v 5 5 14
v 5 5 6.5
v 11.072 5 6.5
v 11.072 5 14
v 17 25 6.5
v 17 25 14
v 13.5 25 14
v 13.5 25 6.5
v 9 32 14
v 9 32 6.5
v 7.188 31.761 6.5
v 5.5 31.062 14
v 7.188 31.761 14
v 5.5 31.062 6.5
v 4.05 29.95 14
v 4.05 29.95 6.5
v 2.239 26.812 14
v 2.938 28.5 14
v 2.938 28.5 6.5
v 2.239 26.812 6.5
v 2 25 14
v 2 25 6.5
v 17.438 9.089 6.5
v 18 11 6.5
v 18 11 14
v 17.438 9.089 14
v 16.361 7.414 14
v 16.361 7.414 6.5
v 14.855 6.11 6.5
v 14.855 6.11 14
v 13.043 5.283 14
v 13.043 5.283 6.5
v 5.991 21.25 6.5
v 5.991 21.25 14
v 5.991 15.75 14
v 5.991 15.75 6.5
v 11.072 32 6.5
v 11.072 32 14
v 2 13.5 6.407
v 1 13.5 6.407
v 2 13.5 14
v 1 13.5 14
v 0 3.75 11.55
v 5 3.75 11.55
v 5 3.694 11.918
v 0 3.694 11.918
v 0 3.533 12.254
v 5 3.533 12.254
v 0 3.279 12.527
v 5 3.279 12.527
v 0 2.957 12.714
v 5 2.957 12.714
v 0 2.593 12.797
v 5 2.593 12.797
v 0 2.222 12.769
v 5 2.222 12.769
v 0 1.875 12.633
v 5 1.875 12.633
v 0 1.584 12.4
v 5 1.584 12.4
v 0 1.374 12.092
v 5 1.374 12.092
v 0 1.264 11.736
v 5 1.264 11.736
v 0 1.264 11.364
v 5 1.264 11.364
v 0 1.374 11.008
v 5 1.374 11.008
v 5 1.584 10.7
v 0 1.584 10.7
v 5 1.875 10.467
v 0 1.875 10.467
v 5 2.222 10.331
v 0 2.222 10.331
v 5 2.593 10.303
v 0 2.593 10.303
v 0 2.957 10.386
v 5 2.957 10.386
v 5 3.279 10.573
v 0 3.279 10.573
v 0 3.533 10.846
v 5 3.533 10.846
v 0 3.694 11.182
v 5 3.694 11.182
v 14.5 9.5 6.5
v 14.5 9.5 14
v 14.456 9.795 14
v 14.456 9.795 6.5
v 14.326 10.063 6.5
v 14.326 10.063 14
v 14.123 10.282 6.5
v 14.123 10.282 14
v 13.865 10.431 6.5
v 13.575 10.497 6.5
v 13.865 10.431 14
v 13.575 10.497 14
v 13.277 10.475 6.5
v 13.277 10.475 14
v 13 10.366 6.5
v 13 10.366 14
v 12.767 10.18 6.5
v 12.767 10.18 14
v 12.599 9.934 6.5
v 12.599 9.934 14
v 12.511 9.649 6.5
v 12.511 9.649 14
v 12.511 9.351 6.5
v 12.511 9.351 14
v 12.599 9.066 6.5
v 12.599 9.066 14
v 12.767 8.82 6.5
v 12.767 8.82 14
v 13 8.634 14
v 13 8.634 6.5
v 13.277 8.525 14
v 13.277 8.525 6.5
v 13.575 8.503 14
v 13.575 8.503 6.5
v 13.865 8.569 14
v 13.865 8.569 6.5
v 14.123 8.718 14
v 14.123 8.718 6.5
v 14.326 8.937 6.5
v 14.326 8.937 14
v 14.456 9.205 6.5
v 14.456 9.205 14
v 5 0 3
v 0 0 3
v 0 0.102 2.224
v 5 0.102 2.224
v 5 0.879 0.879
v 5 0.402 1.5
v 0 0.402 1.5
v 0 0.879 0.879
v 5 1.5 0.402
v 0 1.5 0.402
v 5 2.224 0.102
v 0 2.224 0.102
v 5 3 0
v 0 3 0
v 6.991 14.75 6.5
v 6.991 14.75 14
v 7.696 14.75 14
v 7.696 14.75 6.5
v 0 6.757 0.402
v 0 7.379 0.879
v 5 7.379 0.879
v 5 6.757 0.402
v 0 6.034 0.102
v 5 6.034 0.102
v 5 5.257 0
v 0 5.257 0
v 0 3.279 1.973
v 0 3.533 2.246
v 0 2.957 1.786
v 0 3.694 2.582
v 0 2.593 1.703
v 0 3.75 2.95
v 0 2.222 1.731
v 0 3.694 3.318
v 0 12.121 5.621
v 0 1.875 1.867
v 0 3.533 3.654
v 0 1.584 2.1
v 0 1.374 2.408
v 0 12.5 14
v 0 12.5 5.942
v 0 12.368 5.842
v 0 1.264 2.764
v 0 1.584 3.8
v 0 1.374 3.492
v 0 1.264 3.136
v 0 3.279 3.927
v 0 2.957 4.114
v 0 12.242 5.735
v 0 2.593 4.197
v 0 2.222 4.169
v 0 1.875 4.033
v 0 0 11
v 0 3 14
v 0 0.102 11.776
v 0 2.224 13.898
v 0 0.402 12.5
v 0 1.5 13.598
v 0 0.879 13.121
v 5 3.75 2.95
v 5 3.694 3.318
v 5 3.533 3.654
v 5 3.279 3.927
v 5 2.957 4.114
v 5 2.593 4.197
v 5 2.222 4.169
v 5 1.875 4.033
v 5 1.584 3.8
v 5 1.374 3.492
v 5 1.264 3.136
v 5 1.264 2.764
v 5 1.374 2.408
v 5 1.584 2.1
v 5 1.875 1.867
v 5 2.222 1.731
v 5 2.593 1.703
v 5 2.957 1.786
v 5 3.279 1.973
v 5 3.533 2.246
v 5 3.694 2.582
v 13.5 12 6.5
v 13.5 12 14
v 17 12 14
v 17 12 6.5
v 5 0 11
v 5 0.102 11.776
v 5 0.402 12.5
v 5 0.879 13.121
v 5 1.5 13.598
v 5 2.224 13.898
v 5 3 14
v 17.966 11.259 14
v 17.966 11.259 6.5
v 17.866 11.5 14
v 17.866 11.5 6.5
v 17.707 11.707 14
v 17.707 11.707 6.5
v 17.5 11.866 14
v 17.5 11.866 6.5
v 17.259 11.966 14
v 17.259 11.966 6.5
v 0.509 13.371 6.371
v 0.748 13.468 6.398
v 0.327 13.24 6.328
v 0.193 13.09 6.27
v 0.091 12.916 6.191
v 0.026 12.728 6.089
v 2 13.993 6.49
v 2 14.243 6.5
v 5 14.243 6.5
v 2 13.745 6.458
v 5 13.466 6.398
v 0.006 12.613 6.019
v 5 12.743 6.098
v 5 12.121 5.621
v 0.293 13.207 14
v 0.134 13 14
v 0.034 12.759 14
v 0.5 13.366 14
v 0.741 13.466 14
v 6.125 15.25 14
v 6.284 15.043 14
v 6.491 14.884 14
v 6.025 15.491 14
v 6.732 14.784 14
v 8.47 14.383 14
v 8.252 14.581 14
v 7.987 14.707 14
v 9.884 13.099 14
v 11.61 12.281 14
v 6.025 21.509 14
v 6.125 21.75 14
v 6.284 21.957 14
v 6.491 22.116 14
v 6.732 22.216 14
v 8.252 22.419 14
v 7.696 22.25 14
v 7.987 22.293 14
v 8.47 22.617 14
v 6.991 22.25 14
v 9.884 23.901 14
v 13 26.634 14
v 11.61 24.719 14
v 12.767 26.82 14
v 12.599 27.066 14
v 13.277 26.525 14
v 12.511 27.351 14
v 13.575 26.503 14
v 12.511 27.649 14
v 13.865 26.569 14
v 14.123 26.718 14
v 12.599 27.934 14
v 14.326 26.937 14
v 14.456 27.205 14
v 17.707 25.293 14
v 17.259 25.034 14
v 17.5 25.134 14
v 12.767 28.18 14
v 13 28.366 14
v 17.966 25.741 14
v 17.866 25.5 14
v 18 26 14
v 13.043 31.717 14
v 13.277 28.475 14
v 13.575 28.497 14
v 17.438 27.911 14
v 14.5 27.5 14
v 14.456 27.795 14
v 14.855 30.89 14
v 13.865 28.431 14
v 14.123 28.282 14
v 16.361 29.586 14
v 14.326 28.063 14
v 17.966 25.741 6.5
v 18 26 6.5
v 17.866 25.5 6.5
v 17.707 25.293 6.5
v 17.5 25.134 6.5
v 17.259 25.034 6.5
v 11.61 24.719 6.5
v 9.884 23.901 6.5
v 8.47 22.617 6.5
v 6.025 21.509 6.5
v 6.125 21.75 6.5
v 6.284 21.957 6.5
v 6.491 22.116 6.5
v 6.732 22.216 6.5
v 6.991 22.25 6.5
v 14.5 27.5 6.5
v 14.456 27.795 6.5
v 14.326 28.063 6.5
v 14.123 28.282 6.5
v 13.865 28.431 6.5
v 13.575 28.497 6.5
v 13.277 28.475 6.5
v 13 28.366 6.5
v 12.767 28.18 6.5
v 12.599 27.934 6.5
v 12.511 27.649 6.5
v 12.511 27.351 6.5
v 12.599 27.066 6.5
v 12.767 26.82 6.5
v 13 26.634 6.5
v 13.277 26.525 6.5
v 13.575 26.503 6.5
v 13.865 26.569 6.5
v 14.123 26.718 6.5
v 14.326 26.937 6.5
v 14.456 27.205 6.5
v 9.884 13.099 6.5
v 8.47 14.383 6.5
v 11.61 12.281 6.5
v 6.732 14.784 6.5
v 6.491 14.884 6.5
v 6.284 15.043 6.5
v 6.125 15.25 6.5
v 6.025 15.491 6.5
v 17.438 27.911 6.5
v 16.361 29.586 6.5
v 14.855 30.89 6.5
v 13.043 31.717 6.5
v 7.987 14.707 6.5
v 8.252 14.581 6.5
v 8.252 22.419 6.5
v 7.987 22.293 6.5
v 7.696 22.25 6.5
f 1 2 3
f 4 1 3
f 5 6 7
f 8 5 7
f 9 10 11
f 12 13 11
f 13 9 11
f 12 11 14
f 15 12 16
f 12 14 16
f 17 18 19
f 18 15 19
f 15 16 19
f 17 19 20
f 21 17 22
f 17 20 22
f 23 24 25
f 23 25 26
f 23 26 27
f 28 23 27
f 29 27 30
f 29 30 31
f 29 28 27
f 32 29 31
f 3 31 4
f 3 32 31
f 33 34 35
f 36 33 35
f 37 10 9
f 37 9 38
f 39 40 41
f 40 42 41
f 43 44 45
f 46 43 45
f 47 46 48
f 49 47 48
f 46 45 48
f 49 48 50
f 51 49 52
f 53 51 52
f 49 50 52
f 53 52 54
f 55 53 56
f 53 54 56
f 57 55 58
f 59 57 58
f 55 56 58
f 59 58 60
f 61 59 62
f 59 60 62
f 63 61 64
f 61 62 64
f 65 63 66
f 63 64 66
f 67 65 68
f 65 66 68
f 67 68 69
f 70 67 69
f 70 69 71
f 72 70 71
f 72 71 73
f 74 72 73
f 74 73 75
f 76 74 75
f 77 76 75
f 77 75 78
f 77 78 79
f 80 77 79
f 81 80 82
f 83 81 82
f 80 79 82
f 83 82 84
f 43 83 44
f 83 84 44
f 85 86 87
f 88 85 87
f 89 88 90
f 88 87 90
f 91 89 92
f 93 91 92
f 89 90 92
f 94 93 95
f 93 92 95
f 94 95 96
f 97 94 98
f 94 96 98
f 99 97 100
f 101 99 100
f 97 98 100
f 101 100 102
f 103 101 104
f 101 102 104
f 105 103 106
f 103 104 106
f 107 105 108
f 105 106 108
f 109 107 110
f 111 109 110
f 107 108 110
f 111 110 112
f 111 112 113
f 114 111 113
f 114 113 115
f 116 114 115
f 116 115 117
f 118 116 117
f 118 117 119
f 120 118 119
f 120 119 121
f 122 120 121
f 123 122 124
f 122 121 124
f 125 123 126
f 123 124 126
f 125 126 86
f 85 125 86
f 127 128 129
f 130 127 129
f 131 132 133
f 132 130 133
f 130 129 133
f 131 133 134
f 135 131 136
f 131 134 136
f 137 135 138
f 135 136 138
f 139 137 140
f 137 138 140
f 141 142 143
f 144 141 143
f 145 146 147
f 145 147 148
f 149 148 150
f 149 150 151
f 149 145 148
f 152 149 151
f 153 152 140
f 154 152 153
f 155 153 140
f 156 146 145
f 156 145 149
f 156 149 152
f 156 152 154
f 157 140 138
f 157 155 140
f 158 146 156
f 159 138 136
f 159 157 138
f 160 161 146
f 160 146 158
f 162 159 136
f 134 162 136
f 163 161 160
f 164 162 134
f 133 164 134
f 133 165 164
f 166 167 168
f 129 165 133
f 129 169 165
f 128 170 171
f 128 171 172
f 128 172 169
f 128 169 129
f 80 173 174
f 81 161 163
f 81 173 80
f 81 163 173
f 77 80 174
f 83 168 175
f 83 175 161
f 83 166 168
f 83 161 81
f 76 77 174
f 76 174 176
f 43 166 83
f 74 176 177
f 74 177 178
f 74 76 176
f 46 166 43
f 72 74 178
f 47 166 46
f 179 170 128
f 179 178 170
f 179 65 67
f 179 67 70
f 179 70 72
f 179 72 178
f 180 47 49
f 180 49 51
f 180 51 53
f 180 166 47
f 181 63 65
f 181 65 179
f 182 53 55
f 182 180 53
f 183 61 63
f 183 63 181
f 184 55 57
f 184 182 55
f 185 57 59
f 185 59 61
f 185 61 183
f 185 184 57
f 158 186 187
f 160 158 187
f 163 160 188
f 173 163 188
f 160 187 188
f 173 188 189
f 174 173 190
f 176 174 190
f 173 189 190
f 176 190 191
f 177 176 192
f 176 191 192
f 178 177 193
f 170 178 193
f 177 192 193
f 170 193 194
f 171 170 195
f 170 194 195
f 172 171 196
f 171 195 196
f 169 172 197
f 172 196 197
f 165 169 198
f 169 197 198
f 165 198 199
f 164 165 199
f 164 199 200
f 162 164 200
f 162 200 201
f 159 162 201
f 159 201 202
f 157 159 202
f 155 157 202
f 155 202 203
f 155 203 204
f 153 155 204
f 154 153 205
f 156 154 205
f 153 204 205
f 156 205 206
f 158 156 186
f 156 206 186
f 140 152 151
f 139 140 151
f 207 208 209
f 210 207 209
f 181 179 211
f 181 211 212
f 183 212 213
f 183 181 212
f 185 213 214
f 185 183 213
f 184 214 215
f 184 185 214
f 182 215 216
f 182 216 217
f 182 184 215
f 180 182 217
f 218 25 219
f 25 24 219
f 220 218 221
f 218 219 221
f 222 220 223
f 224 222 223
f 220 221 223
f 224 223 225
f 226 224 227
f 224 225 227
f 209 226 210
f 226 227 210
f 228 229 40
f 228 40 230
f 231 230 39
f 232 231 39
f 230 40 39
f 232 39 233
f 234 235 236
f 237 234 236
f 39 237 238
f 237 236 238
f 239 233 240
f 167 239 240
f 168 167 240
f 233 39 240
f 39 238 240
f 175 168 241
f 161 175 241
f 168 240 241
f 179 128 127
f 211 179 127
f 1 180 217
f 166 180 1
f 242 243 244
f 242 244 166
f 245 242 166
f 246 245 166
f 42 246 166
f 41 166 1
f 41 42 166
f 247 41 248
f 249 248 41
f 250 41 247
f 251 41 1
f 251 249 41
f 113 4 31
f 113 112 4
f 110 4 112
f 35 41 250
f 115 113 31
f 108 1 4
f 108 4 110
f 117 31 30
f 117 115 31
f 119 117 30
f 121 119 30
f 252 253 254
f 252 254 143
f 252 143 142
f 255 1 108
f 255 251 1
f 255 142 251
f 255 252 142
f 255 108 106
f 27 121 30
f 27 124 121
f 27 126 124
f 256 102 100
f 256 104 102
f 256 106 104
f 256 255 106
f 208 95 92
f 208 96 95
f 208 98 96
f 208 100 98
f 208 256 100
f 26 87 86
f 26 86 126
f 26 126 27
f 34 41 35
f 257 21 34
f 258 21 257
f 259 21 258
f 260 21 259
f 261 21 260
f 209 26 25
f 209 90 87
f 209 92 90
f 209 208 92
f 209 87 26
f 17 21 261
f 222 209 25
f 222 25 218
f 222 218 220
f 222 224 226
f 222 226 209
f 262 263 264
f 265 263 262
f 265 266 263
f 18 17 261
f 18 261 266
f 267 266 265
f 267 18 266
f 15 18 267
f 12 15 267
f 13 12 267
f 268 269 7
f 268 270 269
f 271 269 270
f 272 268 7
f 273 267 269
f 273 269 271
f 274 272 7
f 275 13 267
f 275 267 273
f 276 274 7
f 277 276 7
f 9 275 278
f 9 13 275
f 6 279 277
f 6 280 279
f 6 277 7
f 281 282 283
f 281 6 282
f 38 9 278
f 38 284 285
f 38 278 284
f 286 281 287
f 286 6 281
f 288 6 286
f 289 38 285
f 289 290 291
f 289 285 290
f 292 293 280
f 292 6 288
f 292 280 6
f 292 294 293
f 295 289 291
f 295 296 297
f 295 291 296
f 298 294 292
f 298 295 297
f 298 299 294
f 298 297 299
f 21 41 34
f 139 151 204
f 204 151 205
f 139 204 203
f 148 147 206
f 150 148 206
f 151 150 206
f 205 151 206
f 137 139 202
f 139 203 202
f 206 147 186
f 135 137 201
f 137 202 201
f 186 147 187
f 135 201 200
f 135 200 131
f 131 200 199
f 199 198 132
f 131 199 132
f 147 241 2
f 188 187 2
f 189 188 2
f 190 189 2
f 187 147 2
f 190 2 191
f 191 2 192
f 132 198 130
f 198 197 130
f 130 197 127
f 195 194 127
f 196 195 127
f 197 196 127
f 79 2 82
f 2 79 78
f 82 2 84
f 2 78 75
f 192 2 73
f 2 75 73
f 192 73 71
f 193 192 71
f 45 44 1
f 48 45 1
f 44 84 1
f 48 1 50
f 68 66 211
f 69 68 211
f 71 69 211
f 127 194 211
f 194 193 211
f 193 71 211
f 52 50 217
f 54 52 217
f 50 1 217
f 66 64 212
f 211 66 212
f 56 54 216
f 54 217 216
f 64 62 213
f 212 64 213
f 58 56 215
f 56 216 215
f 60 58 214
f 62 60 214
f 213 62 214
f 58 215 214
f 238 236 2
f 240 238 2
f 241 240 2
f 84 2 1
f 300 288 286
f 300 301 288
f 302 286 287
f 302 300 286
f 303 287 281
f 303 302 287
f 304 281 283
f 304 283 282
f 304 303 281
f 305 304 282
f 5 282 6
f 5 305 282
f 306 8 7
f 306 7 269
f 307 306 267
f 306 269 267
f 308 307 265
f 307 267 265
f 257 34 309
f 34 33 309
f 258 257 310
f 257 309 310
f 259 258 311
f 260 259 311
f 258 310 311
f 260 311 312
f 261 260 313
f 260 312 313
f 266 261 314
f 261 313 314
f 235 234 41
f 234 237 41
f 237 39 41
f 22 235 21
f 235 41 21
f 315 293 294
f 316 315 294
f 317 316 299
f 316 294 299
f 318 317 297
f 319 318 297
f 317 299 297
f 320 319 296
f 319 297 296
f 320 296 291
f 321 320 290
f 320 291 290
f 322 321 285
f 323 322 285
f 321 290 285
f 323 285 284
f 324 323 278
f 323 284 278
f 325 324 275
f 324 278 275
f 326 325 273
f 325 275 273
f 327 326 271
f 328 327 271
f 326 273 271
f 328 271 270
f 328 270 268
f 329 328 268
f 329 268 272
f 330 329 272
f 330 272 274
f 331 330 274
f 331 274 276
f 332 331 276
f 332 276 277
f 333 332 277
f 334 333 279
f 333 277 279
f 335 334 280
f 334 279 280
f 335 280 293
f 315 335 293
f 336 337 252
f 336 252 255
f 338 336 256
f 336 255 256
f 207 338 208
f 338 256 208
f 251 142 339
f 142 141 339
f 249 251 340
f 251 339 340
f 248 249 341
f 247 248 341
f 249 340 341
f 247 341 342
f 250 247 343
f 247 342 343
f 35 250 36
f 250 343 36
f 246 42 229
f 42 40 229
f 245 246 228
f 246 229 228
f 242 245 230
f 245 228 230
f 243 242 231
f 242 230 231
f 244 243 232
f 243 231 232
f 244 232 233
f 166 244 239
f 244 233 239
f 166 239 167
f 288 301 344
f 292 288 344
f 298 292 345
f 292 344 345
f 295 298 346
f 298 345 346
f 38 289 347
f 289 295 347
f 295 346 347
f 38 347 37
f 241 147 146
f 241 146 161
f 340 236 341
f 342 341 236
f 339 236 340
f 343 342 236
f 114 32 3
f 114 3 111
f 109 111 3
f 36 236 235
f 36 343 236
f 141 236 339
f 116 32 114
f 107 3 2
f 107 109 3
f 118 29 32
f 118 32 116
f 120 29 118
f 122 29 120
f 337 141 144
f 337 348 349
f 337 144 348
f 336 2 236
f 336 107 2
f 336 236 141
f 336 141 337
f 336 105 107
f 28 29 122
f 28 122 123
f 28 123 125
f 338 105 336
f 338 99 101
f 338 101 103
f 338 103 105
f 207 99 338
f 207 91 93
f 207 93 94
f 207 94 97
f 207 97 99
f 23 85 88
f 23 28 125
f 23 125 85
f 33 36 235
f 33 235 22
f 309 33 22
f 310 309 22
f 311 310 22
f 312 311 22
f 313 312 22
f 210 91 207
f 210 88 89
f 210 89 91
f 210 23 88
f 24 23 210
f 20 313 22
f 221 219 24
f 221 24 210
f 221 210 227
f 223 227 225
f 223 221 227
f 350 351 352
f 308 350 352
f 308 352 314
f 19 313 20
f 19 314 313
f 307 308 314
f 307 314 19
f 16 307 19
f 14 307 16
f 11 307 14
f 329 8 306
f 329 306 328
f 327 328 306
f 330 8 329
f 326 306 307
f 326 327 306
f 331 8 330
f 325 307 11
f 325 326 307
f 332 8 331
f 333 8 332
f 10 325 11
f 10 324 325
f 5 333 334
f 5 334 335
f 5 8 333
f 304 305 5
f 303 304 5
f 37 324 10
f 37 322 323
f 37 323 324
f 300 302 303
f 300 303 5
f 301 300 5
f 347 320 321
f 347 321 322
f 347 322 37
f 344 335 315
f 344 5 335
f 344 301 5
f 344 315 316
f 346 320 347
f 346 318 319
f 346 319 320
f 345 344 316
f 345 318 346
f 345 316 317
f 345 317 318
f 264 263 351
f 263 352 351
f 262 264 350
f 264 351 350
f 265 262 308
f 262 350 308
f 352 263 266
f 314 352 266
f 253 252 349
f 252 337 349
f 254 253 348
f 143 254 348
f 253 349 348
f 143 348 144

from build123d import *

# Parameters (mm, degrees)
F0_W          = 18
F0_H          = 32
F1_DEPTH      = 14
F2_W          = 13
F2_H          = 5
F2_W_2        = 2
F2_H_2        = 18.5
F3_DEPTH      = 14
F4_W          = 27
F4_H          = 6.5
F5_DEPTH      = 18.001
F6_R          = 1
F7_DEPTH      = 7.5
F8_R          = 1.25
F9_DEPTH      = 5
F10_T4_DEPTH  = 5
F11_T4_DEPTH  = 8.1066017178
F11_T9_DEPTH  = 8.1066017178
F11_T12_DEPTH = 20
F11_T14_DEPTH = 11.2132034356
F12_R         = 1
F13_T1_DEPTH  = 42.1410161514
F13_T3_DEPTH  = 42.5
F15_DEPTH     = 14.001
F16_R         = 1


# Not quite as in the source:
# - a fillet or chamfer that OpenCascade refuses, or shapes differently, is made with other operations: its cross-section is extruded or revolved along the edge and cut away or added


with BuildPart() as f1:
    # F0 (on Top) → F1 (new body)
    with BuildSketch(Plane.XY):
        with Locations((9, 16)):
            Rectangle(F0_W, F0_H)
    extrude(amount=F1_DEPTH)

    # F2 (on face) → F3 (cut, through all)
    with BuildSketch(Plane.XY.offset(14)):
        with Locations((11.5, 2.5)):
            Rectangle(F2_W, F2_H)
        with Locations((1, 22.75)):
            Rectangle(F2_W_2, F2_H_2)
    extrude(amount=-F3_DEPTH, mode=Mode.SUBTRACT)

    # F4 (on face) → F5 (cut, through all)
    with BuildSketch(Plane.YZ.offset(18)):
        with Locations((18.5, 3.25)):
            Rectangle(F4_W, F4_H)
    extrude(amount=-F5_DEPTH, mode=Mode.SUBTRACT)

    # F6 (on face) → F7 (cut, through all)
    with BuildSketch(Plane.XY.offset(14)):
        with Locations((13.5, 9.5)):
            Circle(F6_R)
        with BuildLine():
            ThreePointArc((18, 23.1904157598), (15.9251079936, 24.5306592691), (13.5, 25))
            ThreePointArc((13.5, 25), (7, 18.5), (13.5, 12))
            ThreePointArc((13.5, 12), (15.9251079936, 12.4693407309), (18, 13.8095842402))
            Line((18, 13.8095842402), (18, 23.1904157598))
        make_face()
        with Locations((13.5, 27.5)):
            Circle(F6_R)
        with BuildLine():
            Line((18, 25), (13.5, 25))
            ThreePointArc((13.5, 25), (15.9251079936, 24.5306592691), (18, 23.1904157598))
            Line((18, 23.1904157598), (18, 25))
        make_face()
        with BuildLine():
            ThreePointArc((18, 13.8095842402), (15.9251079936, 12.4693407309), (13.5, 12))
            Line((13.5, 12), (18, 12))
            Line((18, 12), (18, 13.8095842402))
        make_face()
    extrude(amount=-F7_DEPTH, mode=Mode.SUBTRACT)

    # F8 (on face) → F9 (cut, through all)
    with BuildSketch(Plane.YZ.offset(5)):
        with Locations((2.5, 11.55)):
            Circle(F8_R)
        with Locations((2.5, 2.95)):
            Circle(F8_R)
    extrude(amount=-F9_DEPTH, mode=Mode.SUBTRACT)

    # F10: chamfer of 8 on 1 edges, made by hand


with BuildPart() as f10_tool2:
    # F10_s3 → F10_t4 (new body)
    with BuildSketch(Plane.YZ.offset(5)):
        Polygon((5, -1.5), (13, 6.5), (5, 6.5), align=None)
    extrude(amount=-F10_T4_DEPTH)

    split(bisect_by=Plane.XY, keep=Keep.TOP)


with BuildPart() as f1_1:
    add(f1.part)

    # F10_t1: union F10_tool2
    add(f10_tool2.part)

    # F11: fillet of radius 3 on 5 edges, made by hand


with BuildPart() as f11_tool2:
    # F11_s3 → F11_t4 (new body)
    with BuildSketch(Plane.YZ.offset(5)):
        with BuildLine():
            ThreePointArc((14.2426406871, 6.5), (13.09459039, 6.2716385975), (12.1213203436, 5.6213203436))
            Line((12.1213203436, 5.6213203436), (13, 6.5))
            Line((13, 6.5), (14.2426406871, 6.5))
        make_face()
    extrude(amount=-F11_T4_DEPTH)

    split(bisect_by=Plane.YZ.offset(2), keep=Keep.TOP)


with BuildPart() as f1_2:
    add(f1_1.part)

    # F11_t1: union F11_tool2
    add(f11_tool2.part)


with BuildPart() as f11_tool7:
    # F11_s8 → F11_t9 (new body)
    with BuildSketch(Plane.YZ.offset(8.1066017178)):
        with BuildLine():
            ThreePointArc((14.2426406871, 6.5), (13.09459039, 6.2716385975), (12.1213203436, 5.6213203436))
            Line((12.1213203436, 5.6213203436), (13, 6.5))
            Line((13, 6.5), (14.2426406871, 6.5))
        make_face()
    extrude(amount=-F11_T9_DEPTH)

    split(bisect_by=Plane.YZ.offset(2), keep=Keep.BOTTOM)

    split(bisect_by=Plane.XZ.offset(-13.5), keep=Keep.TOP)


with BuildPart() as f1_3:
    add(f1_2.part)

    # F11_t6: union F11_tool7
    add(f11_tool7.part)

    # F11_s13 → F11_t12 (cut)
    with BuildSketch(Plane.YZ.offset(-7.5)):
        with BuildLine():
            ThreePointArc((0, 11), (0.8786796564, 13.1213203436), (3, 14))
            Line((3, 14), (0, 14))
            Line((0, 14), (0, 11))
        make_face()
        with BuildLine():
            ThreePointArc((0, 3), (0.8786796564, 0.8786796564), (3, 0))
            Line((3, 0), (0, 0))
            Line((0, 0), (0, 3))
        make_face()
    extrude(amount=F11_T12_DEPTH, mode=Mode.SUBTRACT)

    # F11_s15 → F11_t14 (cut)
    with BuildSketch(Plane.YZ.offset(-3.1066017178)):
        with BuildLine():
            ThreePointArc((7.3786796564, 0.8786796564), (6.40540961, 0.2283614025), (5.2573593129, 0))
            Line((5.2573593129, 0), (6.5, 0))
            Line((6.5, 0), (7.3786796564, 0.8786796564))
        make_face()
    extrude(amount=F11_T14_DEPTH, mode=Mode.SUBTRACT)

    # F12
    f12_edges = [f1_3.edges().sort_by_distance(p)[0] for p in [
        (18, 12, 10.25),
        (18, 25, 10.25),
    ]]
    fillet(f12_edges, radius=F12_R)

    # F13: fillet of radius 7 on 3 edges, made by hand

    # F13_s2 → F13_t1 (cut)
    with BuildSketch(Plane.XY.offset(-10.8205080757)):
        with BuildLine():
            ThreePointArc((18, 11), (15.6543724647, 6.7084973779), (11.0717967697, 5))
            Line((11.0717967697, 5), (11.0717967697, 4.86))
            Line((11.0717967697, 4.86), (18, 4.86))
            Line((18, 4.86), (18.14, 5))
            ThreePointArc((18.14, 5), (18.14, 8), (18.1385640646, 10.98))
            Line((18.1385640646, 10.98), (18, 11))
        make_face()
        with BuildLine():
            ThreePointArc((18, 26), (15.6543724647, 30.2915026221), (11.0717967697, 32))
            Line((11.0717967697, 32), (11.0717967697, 32.14))
            Line((11.0717967697, 32.14), (18, 32.14))
            Line((18, 32.14), (18.14, 32))
            ThreePointArc((18.14, 32), (18.14, 29), (18.1385640646, 26.02))
            Line((18.1385640646, 26.02), (18, 26))
        make_face()
    extrude(amount=F13_T1_DEPTH, mode=Mode.SUBTRACT)

    # F13_s4 → F13_t3 (cut)
    with BuildSketch(Plane.XY.offset(-11)):
        with BuildLine():
            ThreePointArc((9, 32), (4.0502525317, 29.9497474683), (2, 25))
            Line((2, 25), (1.86, 25))
            Line((1.86, 25), (1.86, 32.14))
            Line((1.86, 32.14), (9, 32.14))
            Line((9, 32.14), (9, 32))
        make_face()
    extrude(amount=F13_T3_DEPTH, mode=Mode.SUBTRACT)

    # F14 (on face) → F15 (cut, through all)
    with BuildSketch(Plane.XY.offset(14)):
        with BuildLine():
            ThreePointArc((8.1908098546, 14.75), (7, 18.5), (8.1908098546, 22.25))
            Line((8.1908098546, 22.25), (5.9908098546, 22.25))
            Line((5.9908098546, 22.25), (5.9908098546, 14.75))
            Line((5.9908098546, 14.75), (8.1908098546, 14.75))
        make_face()
    extrude(amount=-F15_DEPTH, mode=Mode.SUBTRACT)

    # F16
    f16_edges = [f1_3.edges().sort_by_distance(p)[0] for p in [
        (5.99081, 14.75, 10.25),
        (5.99081, 22.25, 10.25),
        (8.19081, 22.25, 10.25),
        (8.19081, 14.75, 10.25),
        (0, 13.5, 10.203314),
    ]]
    fillet(f16_edges, radius=F16_R)


solid = f1_3.part
